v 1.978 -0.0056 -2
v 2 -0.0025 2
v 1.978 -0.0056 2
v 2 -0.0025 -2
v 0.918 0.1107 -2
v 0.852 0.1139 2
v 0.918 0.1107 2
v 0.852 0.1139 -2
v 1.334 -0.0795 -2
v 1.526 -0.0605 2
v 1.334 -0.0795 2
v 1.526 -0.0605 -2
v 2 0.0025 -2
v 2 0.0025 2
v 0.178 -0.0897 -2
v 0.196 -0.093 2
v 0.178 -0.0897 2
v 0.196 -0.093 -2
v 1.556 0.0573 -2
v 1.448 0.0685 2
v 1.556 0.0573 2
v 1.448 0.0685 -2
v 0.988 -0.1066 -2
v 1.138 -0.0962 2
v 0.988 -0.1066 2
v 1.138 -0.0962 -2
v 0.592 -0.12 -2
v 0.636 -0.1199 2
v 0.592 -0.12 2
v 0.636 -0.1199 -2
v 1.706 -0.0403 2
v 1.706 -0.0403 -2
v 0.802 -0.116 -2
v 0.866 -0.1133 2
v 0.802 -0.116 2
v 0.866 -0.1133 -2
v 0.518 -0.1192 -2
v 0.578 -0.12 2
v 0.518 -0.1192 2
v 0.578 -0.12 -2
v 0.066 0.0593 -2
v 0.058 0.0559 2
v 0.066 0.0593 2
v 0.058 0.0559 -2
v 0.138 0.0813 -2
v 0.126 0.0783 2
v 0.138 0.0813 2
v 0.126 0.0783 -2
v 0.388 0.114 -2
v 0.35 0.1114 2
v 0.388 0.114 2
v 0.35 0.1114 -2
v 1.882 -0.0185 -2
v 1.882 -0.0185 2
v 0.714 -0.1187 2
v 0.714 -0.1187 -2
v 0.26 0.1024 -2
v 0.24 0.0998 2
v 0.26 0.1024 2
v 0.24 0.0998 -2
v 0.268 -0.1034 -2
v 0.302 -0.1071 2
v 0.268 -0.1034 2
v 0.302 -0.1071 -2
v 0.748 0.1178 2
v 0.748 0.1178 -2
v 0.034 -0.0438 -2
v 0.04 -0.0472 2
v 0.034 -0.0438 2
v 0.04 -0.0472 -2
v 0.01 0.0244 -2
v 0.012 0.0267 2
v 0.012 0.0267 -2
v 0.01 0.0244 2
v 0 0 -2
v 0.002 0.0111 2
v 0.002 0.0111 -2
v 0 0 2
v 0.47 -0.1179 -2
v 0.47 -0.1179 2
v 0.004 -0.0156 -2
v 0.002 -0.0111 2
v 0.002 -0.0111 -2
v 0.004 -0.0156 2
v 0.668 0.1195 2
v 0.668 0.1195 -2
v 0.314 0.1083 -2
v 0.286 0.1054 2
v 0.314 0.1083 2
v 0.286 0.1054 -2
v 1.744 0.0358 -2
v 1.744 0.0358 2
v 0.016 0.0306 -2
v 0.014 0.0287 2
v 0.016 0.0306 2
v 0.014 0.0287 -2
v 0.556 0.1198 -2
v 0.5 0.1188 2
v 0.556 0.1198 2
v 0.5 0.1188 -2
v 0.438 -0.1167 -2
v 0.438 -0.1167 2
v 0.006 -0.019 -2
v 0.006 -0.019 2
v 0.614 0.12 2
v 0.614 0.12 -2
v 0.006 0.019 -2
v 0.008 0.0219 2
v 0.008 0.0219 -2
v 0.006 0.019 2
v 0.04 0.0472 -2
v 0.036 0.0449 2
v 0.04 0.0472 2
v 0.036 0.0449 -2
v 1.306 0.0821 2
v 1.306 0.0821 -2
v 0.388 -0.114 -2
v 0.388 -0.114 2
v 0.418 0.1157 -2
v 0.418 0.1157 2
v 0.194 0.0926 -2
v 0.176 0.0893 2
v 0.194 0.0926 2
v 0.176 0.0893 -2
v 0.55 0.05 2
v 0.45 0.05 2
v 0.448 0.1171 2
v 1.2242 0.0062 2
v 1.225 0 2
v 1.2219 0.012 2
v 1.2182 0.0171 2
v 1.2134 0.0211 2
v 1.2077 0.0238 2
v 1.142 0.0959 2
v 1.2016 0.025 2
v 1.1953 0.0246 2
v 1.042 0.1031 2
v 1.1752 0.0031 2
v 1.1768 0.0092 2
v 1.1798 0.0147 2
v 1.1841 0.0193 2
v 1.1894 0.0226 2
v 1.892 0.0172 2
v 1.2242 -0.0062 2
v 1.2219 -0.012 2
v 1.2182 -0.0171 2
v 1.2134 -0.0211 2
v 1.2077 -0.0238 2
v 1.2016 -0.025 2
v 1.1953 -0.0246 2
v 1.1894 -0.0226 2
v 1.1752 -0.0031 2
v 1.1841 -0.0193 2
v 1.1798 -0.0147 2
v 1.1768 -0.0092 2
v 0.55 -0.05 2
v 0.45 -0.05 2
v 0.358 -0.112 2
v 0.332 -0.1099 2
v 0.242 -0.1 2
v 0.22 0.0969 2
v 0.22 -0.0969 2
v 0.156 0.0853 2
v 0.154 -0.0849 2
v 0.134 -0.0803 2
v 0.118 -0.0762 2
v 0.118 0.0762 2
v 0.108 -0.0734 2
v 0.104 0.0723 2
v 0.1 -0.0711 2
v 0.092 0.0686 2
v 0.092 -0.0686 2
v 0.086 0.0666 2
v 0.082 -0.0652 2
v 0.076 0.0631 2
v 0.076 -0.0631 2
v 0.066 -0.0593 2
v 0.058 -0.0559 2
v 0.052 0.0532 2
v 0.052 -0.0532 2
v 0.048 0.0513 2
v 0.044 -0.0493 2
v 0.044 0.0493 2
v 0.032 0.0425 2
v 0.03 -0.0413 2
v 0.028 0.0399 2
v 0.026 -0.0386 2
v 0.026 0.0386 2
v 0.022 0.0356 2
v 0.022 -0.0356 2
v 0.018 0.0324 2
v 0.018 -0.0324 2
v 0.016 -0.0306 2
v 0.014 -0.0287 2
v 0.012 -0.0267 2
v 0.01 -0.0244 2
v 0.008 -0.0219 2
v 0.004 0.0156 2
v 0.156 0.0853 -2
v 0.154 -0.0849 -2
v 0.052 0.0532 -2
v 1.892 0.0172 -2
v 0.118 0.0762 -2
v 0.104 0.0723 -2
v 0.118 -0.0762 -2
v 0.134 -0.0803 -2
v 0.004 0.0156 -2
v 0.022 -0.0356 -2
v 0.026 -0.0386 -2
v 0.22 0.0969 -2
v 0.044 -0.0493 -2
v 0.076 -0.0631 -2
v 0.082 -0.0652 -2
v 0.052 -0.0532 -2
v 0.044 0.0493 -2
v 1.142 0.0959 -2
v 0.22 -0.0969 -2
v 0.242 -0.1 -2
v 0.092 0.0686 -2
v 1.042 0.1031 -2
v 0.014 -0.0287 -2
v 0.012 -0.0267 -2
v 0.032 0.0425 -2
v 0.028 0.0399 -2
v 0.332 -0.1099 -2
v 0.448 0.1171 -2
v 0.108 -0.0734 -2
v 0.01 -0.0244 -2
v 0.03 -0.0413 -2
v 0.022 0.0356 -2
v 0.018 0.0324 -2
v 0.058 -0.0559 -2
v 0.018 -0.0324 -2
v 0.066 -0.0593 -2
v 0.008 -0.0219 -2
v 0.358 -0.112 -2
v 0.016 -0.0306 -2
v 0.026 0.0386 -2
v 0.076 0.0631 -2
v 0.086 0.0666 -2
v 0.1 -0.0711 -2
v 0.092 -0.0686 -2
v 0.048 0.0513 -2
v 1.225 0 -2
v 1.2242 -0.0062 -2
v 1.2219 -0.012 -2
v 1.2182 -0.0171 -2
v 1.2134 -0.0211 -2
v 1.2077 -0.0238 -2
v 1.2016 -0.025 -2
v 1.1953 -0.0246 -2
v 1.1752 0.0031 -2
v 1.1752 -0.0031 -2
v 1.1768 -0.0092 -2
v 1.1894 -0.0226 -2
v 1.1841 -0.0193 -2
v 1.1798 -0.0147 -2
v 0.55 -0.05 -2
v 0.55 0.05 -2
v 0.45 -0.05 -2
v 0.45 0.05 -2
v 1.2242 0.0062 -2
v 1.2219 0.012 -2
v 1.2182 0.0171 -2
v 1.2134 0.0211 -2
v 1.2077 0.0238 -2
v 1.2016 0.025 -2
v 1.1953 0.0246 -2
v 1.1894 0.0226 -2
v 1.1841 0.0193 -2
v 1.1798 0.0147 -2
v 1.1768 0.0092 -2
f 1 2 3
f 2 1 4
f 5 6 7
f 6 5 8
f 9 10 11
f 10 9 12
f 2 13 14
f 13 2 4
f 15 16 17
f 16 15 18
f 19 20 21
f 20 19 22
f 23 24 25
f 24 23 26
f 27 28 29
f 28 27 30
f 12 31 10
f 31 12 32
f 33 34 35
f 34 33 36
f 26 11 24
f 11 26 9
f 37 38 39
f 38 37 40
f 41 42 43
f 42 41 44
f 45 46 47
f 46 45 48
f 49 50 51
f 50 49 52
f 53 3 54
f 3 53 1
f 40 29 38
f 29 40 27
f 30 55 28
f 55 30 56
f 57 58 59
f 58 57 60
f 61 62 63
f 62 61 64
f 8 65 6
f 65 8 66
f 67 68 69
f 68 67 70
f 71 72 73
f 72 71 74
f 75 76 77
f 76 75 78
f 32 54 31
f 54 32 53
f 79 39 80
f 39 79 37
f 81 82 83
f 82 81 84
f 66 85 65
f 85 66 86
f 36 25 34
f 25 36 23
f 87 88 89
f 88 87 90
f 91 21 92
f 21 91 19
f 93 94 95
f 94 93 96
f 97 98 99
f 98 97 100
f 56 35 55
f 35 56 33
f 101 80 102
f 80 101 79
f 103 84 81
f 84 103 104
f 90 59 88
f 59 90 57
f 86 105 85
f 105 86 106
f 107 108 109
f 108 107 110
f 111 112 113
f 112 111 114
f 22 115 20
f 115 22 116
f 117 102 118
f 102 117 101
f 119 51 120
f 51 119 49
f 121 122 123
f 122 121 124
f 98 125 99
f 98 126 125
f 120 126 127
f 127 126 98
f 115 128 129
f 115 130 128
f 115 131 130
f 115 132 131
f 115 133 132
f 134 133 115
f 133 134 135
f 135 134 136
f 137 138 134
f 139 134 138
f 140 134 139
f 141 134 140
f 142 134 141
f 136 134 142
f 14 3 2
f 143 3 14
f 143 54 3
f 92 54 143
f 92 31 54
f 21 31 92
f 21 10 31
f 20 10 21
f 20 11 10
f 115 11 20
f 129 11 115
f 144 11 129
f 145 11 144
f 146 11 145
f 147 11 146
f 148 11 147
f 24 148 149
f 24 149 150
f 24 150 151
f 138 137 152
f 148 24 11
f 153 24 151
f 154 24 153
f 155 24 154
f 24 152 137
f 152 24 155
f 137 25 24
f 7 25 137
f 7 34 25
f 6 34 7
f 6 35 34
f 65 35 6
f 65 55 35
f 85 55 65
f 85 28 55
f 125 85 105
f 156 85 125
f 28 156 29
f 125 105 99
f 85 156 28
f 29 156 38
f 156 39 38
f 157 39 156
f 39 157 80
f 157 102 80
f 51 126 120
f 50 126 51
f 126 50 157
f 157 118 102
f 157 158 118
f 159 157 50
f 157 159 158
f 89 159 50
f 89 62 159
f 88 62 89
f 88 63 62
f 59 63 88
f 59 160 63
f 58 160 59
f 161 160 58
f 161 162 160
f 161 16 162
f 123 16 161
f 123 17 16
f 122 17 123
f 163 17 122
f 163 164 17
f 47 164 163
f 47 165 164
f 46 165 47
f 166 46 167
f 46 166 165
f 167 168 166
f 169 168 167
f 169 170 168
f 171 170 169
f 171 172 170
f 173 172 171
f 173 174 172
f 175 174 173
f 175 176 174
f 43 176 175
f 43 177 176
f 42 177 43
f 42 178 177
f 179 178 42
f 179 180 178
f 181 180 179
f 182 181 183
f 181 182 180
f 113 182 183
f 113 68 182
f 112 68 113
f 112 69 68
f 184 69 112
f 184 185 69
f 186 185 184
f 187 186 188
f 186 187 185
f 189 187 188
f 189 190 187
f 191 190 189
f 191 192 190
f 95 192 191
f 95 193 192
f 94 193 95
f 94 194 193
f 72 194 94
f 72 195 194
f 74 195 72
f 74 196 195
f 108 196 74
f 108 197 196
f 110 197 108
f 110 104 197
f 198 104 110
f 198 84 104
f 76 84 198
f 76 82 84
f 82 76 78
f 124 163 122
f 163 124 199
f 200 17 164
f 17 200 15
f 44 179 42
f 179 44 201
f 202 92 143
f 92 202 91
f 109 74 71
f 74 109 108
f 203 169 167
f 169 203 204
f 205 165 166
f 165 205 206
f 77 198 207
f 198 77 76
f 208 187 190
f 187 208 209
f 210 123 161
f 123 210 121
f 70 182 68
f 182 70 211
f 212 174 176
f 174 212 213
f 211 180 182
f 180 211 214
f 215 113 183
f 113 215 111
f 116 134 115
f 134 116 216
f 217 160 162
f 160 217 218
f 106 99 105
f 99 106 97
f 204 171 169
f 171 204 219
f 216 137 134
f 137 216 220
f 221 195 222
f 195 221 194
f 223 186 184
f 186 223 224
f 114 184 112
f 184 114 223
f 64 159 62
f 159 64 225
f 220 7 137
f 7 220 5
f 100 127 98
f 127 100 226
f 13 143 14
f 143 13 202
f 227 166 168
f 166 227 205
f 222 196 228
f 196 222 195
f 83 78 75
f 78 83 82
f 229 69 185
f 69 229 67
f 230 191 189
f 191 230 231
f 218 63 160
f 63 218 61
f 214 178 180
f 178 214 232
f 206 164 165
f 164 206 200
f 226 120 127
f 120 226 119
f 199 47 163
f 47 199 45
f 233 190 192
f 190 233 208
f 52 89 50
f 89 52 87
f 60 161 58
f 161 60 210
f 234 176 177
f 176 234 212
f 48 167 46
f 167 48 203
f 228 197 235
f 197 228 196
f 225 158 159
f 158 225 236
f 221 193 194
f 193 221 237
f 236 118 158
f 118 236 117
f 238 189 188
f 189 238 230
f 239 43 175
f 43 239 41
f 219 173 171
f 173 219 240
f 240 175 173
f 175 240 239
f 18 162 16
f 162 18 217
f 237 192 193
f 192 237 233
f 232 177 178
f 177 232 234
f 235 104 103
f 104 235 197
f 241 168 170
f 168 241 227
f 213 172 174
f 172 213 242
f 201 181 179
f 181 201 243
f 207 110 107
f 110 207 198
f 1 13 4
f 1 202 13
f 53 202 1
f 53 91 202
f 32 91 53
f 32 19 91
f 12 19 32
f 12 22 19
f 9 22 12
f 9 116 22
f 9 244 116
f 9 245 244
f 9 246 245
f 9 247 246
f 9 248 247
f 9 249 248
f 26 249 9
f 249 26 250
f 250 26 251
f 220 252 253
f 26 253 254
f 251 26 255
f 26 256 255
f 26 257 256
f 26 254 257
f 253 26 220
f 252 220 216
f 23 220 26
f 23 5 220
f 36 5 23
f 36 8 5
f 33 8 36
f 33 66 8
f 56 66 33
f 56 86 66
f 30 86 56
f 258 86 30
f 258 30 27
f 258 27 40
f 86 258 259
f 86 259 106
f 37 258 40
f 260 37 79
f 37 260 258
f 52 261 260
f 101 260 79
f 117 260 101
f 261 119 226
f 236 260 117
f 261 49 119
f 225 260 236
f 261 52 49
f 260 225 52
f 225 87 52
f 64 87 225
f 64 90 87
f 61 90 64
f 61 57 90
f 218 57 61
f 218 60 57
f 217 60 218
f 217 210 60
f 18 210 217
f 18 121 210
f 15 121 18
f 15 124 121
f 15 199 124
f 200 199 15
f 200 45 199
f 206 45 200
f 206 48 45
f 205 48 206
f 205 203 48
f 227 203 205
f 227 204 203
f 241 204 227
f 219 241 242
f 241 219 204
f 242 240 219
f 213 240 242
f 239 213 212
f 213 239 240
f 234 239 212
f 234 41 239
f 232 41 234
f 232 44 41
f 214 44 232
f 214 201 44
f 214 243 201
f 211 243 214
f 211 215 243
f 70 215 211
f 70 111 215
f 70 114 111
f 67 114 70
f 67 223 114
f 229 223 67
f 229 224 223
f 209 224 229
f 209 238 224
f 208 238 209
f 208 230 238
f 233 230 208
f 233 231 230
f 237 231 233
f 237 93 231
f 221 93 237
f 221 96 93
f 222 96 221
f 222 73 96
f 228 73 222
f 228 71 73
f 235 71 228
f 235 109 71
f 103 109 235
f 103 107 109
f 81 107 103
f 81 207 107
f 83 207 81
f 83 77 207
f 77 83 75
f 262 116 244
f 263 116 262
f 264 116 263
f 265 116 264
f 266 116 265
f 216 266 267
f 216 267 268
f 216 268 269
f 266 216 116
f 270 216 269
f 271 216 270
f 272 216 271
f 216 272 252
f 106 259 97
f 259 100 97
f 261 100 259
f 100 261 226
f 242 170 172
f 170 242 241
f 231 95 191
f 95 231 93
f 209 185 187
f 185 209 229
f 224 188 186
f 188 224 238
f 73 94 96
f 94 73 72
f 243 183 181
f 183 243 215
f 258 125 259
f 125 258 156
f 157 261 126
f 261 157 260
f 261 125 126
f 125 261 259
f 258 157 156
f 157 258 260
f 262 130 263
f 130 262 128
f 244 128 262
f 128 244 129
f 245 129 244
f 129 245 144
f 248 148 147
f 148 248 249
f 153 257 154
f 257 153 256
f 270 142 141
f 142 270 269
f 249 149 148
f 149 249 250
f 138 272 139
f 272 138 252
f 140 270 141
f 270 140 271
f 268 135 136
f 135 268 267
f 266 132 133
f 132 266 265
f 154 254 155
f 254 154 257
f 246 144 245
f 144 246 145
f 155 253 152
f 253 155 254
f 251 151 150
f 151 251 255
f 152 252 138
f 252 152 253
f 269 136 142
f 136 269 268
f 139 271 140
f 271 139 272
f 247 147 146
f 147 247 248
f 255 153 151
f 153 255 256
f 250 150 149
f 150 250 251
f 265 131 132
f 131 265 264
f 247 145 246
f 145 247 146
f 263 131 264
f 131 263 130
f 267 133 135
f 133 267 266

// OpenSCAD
function cat(L1, L2) = [for(L=[L1, L2], a=L) a];

function calc_y(x, t)  = 5.0*t*(0.2969*sqrt(x) - 0.1260*x-0.3516*x^2 + 0.2843*x^3 - 0.1015*x^4);


n = 1000;
end = 1;
res = end/n;


thickness = 4;
wing_chord = 2.0;
square_bar_dim = 1.0;

x = [0:res:end];
t = 24.0/100;
airfoil = [
    for (a = [0:res:end]) [a, calc_y(a, t)],
    for (a = [0:res:end]) [a, -1.0*calc_y(a, t)],
    [end, -1.0 * calc_y(end,t)],
    [end, calc_y(end,t)]
];



difference(){
    linear_extrude(height = thickness, center = true, scale = 1.0)
    resize([wing_chord, 0.0, 0.0])
    polygon(airfoil);
    color("lightBlue")
    rotate([0.0,0.0,0.0])
    translate([0.25*wing_chord, 0.0, 0.0])
    cube([0.1,0.1,thickness], center = true);
    
    translate([0.6*wing_chord, 0.0, 0.0])
    cylinder(h=thickness, r=0.025, center = true, $fn=25);
} 
